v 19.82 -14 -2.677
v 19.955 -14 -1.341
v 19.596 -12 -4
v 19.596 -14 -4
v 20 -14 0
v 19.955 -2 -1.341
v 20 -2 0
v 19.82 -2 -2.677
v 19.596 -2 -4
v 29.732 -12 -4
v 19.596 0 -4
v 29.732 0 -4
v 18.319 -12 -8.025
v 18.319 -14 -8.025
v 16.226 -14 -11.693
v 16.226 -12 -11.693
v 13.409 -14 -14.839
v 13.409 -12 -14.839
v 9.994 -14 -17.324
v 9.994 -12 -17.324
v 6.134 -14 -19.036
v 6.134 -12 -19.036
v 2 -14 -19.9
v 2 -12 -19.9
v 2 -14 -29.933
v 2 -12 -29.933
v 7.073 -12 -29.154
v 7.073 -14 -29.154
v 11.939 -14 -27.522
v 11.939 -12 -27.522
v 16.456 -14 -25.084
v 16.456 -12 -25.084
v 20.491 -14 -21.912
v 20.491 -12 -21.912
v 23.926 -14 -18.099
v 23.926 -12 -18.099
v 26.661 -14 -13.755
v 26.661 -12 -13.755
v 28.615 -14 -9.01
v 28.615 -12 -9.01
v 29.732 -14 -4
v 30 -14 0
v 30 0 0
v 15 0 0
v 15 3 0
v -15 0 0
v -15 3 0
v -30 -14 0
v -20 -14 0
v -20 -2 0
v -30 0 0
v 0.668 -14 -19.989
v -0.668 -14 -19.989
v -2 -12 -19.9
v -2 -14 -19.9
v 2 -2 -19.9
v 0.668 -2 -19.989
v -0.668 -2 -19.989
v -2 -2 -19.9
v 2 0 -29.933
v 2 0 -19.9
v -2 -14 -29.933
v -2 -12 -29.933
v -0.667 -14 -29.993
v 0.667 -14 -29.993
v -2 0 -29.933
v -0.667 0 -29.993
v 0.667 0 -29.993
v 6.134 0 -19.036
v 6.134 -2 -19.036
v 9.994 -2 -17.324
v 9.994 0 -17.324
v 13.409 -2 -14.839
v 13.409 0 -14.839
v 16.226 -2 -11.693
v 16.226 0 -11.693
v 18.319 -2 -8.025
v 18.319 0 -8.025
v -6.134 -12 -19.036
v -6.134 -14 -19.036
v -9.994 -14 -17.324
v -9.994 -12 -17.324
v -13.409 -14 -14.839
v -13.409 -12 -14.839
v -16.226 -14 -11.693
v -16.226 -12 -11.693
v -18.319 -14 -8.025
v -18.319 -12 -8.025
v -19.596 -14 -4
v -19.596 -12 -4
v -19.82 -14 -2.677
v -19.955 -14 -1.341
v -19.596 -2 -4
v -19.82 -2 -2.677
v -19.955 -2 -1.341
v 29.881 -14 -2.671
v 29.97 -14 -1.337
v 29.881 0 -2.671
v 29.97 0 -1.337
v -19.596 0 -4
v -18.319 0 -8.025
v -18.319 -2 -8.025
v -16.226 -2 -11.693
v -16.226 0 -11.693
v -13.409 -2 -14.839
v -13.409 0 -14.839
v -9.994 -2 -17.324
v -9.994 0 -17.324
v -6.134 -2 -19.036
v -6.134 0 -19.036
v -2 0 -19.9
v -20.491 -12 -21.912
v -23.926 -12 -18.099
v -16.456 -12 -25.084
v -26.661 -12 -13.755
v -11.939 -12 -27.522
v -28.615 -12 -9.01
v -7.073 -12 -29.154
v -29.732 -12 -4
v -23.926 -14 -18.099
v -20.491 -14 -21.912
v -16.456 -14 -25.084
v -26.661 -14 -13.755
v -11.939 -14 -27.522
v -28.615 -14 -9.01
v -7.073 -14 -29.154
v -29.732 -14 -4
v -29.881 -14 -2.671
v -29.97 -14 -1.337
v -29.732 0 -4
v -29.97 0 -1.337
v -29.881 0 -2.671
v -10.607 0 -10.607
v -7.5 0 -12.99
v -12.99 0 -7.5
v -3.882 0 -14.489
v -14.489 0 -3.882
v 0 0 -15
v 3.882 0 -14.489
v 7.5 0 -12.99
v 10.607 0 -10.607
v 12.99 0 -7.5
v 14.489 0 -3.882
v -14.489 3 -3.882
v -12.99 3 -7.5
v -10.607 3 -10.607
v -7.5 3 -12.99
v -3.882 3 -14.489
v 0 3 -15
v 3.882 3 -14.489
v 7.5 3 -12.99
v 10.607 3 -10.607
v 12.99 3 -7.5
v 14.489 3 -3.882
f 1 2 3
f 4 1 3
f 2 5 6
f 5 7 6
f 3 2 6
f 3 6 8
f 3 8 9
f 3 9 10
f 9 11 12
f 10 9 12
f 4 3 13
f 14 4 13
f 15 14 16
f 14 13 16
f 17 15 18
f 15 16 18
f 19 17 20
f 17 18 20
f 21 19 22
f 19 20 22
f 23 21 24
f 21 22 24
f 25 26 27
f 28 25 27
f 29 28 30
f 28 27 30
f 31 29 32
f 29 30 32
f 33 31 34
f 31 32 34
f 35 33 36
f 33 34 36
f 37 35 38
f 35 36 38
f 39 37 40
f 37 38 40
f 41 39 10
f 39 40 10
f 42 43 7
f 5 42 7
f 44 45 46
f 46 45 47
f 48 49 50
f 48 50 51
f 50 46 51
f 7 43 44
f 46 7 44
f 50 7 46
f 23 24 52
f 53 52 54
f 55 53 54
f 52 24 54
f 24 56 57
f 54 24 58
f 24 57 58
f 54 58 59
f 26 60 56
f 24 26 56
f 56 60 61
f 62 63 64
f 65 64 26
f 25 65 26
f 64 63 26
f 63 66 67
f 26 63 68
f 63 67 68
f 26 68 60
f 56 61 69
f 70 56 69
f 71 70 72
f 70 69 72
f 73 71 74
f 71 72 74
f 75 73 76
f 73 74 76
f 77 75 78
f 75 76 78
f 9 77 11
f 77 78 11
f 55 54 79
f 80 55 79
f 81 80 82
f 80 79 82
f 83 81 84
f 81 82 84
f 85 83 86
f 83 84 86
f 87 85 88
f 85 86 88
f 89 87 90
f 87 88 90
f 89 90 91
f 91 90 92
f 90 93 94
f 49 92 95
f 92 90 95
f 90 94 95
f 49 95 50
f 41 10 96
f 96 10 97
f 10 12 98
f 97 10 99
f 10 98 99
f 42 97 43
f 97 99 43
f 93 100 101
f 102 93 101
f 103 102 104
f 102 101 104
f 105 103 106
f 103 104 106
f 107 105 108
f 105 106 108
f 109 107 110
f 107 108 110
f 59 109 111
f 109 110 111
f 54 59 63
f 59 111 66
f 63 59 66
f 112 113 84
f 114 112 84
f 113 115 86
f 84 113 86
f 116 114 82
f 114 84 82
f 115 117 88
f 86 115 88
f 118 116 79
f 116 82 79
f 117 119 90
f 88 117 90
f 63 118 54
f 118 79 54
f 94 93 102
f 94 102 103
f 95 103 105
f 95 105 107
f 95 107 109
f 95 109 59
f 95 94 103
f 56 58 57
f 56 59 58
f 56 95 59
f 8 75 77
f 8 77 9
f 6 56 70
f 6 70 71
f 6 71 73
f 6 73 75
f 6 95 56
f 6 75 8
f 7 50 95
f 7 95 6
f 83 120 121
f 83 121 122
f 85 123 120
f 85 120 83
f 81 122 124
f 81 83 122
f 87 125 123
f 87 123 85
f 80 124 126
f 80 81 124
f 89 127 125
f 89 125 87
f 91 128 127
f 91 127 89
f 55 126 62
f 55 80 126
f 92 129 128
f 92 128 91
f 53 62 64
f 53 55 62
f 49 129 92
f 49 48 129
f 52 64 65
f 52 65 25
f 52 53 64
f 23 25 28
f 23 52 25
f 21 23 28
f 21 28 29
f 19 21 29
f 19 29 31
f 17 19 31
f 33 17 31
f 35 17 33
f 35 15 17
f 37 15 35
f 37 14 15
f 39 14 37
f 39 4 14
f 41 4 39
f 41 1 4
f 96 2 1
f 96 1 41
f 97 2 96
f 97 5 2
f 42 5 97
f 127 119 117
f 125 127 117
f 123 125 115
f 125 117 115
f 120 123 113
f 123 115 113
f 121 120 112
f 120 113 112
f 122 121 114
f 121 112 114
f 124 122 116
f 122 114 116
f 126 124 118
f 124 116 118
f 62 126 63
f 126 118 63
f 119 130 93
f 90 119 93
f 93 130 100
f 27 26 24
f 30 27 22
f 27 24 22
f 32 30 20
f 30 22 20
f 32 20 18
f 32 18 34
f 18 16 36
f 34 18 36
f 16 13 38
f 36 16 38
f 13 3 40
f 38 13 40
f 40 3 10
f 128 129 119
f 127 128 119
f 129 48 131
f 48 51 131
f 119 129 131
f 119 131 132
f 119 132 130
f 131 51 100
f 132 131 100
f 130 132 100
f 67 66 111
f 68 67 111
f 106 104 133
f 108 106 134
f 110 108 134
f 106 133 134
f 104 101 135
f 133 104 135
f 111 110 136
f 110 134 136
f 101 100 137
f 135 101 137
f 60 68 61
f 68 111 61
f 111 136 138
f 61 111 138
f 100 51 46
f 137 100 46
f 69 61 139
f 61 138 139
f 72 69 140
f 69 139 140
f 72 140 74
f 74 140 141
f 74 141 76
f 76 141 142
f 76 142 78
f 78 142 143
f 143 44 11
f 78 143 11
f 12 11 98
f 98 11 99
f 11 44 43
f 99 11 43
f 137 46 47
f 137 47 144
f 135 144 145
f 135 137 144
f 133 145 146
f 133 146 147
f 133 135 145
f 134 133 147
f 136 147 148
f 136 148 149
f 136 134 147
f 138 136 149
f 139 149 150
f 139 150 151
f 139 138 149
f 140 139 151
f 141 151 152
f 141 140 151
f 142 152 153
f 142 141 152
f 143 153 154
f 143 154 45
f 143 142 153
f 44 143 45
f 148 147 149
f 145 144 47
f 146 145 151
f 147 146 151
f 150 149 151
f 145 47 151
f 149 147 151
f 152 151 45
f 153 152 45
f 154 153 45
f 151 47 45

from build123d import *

# Parameters (mm, degrees)
F1_DEPTH = 3
F3_DEPTH = 2
F4_DEPTH = 12
F5_START = 12
F5_DEPTH = 2


with BuildPart() as f1:
    # F0 (on Front) → F1 (new body)
    with BuildSketch(Plane.XZ):
        with BuildLine():
            Line((15, 0), (-15, 0))
            ThreePointArc((-15, 0), (0, -15), (15, 0))
        make_face()
    extrude(amount=-F1_DEPTH)

    # F2 (on face) → F3 (join)
    with BuildSketch(Plane.XZ):
        with BuildLine():
            ThreePointArc((-19.5959179423, -4), (-13.408818757, -14.8392580523), (-2, -19.8997487421))
            ThreePointArc((-2, -19.8997487421), (0, -20), (2, -19.8997487421))
            ThreePointArc((2, -19.8997487421), (13.408818757, -14.8392580523), (19.5959179423, -4))
            Line((19.5959179423, -4), (14.4568322948, -4))
            ThreePointArc((14.4568322948, -4), (0, -15), (-14.4568322948, -4))
            Line((-14.4568322948, -4), (-19.5959179423, -4))
        make_face()
        with BuildLine():
            Line((14.4568322948, -4), (-14.4568322948, -4))
            ThreePointArc((-14.4568322948, -4), (0, -15), (14.4568322948, -4))
        make_face()
        with BuildLine():
            ThreePointArc((-20, 0), (-19.8987230601, -2.0101792401), (-19.5959179423, -4))
            Line((-19.5959179423, -4), (-14.4568322948, -4))
            ThreePointArc((-14.4568322948, -4), (-14.8635877974, -2.0183552187), (-15, 0))
            Line((-15, 0), (-20, 0))
        make_face()
        with BuildLine():
            Line((14.4568322948, -4), (19.5959179423, -4))
            ThreePointArc((19.5959179423, -4), (19.8987230601, -2.0101792401), (20, 0))
            Line((20, 0), (15, 0))
            ThreePointArc((15, 0), (14.8635877974, -2.0183552187), (14.4568322948, -4))
        make_face()
        with BuildLine():
            ThreePointArc((-15, 0), (-14.8635877974, -2.0183552187), (-14.4568322948, -4))
            Line((-14.4568322948, -4), (14.4568322948, -4))
            ThreePointArc((14.4568322948, -4), (14.8635877974, -2.0183552187), (15, 0))
            Line((15, 0), (-15, 0))
        make_face()
        with BuildLine():
            Line((-29.7321374946, -4), (-19.5959179423, -4))
            ThreePointArc((-19.5959179423, -4), (-19.8987230601, -2.0101792401), (-20, 0))
            Line((-20, 0), (-30, 0))
            ThreePointArc((-30, 0), (-29.9329594664, -2.0044793789), (-29.7321374946, -4))
        make_face()
        with BuildLine():
            ThreePointArc((20, 0), (19.8987230601, -2.0101792401), (19.5959179423, -4))
            Line((19.5959179423, -4), (29.7321374946, -4))
            ThreePointArc((29.7321374946, -4), (29.9329594664, -2.0044793789), (30, 0))
            Line((30, 0), (20, 0))
        make_face()
        with BuildLine():
            ThreePointArc((2, -19.8997487421), (0, -20), (-2, -19.8997487421))
            Line((-2, -19.8997487421), (-2, -29.9332590942))
            ThreePointArc((-2, -29.9332590942), (0, -30), (2, -29.9332590942))
            Line((2, -29.9332590942), (2, -19.8997487421))
        make_face()
    extrude(amount=F3_DEPTH)

    # F2 (on face) → F4 (join)
    with BuildSketch(Plane.XZ):
        with BuildLine():
            Line((-29.7321374946, -4), (-19.5959179423, -4))
            ThreePointArc((-19.5959179423, -4), (-19.8987230601, -2.0101792401), (-20, 0))
            Line((-20, 0), (-30, 0))
            ThreePointArc((-30, 0), (-29.9329594664, -2.0044793789), (-29.7321374946, -4))
        make_face()
        with BuildLine():
            ThreePointArc((20, 0), (19.8987230601, -2.0101792401), (19.5959179423, -4))
            Line((19.5959179423, -4), (29.7321374946, -4))
            ThreePointArc((29.7321374946, -4), (29.9329594664, -2.0044793789), (30, 0))
            Line((30, 0), (20, 0))
        make_face()
        with BuildLine():
            ThreePointArc((2, -19.8997487421), (0, -20), (-2, -19.8997487421))
            Line((-2, -19.8997487421), (-2, -29.9332590942))
            ThreePointArc((-2, -29.9332590942), (0, -30), (2, -29.9332590942))
            Line((2, -29.9332590942), (2, -19.8997487421))
        make_face()
    extrude(amount=F4_DEPTH)

    # F2 (on face) → F5 (join)
    with BuildSketch(Plane.XZ.offset(F5_START)):
        with BuildLine():
            Line((-2, -29.9332590942), (-2, -19.8997487421))
            ThreePointArc((-2, -19.8997487421), (-13.408818757, -14.8392580523), (-19.5959179423, -4))
            Line((-19.5959179423, -4), (-29.7321374946, -4))
            ThreePointArc((-29.7321374946, -4), (-20.4906227164, -21.9119688913), (-2, -29.9332590942))
        make_face()
        with BuildLine():
            ThreePointArc((19.5959179423, -4), (13.408818757, -14.8392580523), (2, -19.8997487421))
            Line((2, -19.8997487421), (2, -29.9332590942))
            ThreePointArc((2, -29.9332590942), (20.4906227164, -21.9119688913), (29.7321374946, -4))
            Line((29.7321374946, -4), (19.5959179423, -4))
        make_face()
        with BuildLine():
            Line((-29.7321374946, -4), (-19.5959179423, -4))
            ThreePointArc((-19.5959179423, -4), (-19.8987230601, -2.0101792401), (-20, 0))
            Line((-20, 0), (-30, 0))
            ThreePointArc((-30, 0), (-29.9329594664, -2.0044793789), (-29.7321374946, -4))
        make_face()
        with BuildLine():
            ThreePointArc((2, -19.8997487421), (0, -20), (-2, -19.8997487421))
            Line((-2, -19.8997487421), (-2, -29.9332590942))
            ThreePointArc((-2, -29.9332590942), (0, -30), (2, -29.9332590942))
            Line((2, -29.9332590942), (2, -19.8997487421))
        make_face()
        with BuildLine():
            ThreePointArc((20, 0), (19.8987230601, -2.0101792401), (19.5959179423, -4))
            Line((19.5959179423, -4), (29.7321374946, -4))
            ThreePointArc((29.7321374946, -4), (29.9329594664, -2.0044793789), (30, 0))
            Line((30, 0), (20, 0))
        make_face()
    extrude(amount=F5_DEPTH)


solid = f1.part
